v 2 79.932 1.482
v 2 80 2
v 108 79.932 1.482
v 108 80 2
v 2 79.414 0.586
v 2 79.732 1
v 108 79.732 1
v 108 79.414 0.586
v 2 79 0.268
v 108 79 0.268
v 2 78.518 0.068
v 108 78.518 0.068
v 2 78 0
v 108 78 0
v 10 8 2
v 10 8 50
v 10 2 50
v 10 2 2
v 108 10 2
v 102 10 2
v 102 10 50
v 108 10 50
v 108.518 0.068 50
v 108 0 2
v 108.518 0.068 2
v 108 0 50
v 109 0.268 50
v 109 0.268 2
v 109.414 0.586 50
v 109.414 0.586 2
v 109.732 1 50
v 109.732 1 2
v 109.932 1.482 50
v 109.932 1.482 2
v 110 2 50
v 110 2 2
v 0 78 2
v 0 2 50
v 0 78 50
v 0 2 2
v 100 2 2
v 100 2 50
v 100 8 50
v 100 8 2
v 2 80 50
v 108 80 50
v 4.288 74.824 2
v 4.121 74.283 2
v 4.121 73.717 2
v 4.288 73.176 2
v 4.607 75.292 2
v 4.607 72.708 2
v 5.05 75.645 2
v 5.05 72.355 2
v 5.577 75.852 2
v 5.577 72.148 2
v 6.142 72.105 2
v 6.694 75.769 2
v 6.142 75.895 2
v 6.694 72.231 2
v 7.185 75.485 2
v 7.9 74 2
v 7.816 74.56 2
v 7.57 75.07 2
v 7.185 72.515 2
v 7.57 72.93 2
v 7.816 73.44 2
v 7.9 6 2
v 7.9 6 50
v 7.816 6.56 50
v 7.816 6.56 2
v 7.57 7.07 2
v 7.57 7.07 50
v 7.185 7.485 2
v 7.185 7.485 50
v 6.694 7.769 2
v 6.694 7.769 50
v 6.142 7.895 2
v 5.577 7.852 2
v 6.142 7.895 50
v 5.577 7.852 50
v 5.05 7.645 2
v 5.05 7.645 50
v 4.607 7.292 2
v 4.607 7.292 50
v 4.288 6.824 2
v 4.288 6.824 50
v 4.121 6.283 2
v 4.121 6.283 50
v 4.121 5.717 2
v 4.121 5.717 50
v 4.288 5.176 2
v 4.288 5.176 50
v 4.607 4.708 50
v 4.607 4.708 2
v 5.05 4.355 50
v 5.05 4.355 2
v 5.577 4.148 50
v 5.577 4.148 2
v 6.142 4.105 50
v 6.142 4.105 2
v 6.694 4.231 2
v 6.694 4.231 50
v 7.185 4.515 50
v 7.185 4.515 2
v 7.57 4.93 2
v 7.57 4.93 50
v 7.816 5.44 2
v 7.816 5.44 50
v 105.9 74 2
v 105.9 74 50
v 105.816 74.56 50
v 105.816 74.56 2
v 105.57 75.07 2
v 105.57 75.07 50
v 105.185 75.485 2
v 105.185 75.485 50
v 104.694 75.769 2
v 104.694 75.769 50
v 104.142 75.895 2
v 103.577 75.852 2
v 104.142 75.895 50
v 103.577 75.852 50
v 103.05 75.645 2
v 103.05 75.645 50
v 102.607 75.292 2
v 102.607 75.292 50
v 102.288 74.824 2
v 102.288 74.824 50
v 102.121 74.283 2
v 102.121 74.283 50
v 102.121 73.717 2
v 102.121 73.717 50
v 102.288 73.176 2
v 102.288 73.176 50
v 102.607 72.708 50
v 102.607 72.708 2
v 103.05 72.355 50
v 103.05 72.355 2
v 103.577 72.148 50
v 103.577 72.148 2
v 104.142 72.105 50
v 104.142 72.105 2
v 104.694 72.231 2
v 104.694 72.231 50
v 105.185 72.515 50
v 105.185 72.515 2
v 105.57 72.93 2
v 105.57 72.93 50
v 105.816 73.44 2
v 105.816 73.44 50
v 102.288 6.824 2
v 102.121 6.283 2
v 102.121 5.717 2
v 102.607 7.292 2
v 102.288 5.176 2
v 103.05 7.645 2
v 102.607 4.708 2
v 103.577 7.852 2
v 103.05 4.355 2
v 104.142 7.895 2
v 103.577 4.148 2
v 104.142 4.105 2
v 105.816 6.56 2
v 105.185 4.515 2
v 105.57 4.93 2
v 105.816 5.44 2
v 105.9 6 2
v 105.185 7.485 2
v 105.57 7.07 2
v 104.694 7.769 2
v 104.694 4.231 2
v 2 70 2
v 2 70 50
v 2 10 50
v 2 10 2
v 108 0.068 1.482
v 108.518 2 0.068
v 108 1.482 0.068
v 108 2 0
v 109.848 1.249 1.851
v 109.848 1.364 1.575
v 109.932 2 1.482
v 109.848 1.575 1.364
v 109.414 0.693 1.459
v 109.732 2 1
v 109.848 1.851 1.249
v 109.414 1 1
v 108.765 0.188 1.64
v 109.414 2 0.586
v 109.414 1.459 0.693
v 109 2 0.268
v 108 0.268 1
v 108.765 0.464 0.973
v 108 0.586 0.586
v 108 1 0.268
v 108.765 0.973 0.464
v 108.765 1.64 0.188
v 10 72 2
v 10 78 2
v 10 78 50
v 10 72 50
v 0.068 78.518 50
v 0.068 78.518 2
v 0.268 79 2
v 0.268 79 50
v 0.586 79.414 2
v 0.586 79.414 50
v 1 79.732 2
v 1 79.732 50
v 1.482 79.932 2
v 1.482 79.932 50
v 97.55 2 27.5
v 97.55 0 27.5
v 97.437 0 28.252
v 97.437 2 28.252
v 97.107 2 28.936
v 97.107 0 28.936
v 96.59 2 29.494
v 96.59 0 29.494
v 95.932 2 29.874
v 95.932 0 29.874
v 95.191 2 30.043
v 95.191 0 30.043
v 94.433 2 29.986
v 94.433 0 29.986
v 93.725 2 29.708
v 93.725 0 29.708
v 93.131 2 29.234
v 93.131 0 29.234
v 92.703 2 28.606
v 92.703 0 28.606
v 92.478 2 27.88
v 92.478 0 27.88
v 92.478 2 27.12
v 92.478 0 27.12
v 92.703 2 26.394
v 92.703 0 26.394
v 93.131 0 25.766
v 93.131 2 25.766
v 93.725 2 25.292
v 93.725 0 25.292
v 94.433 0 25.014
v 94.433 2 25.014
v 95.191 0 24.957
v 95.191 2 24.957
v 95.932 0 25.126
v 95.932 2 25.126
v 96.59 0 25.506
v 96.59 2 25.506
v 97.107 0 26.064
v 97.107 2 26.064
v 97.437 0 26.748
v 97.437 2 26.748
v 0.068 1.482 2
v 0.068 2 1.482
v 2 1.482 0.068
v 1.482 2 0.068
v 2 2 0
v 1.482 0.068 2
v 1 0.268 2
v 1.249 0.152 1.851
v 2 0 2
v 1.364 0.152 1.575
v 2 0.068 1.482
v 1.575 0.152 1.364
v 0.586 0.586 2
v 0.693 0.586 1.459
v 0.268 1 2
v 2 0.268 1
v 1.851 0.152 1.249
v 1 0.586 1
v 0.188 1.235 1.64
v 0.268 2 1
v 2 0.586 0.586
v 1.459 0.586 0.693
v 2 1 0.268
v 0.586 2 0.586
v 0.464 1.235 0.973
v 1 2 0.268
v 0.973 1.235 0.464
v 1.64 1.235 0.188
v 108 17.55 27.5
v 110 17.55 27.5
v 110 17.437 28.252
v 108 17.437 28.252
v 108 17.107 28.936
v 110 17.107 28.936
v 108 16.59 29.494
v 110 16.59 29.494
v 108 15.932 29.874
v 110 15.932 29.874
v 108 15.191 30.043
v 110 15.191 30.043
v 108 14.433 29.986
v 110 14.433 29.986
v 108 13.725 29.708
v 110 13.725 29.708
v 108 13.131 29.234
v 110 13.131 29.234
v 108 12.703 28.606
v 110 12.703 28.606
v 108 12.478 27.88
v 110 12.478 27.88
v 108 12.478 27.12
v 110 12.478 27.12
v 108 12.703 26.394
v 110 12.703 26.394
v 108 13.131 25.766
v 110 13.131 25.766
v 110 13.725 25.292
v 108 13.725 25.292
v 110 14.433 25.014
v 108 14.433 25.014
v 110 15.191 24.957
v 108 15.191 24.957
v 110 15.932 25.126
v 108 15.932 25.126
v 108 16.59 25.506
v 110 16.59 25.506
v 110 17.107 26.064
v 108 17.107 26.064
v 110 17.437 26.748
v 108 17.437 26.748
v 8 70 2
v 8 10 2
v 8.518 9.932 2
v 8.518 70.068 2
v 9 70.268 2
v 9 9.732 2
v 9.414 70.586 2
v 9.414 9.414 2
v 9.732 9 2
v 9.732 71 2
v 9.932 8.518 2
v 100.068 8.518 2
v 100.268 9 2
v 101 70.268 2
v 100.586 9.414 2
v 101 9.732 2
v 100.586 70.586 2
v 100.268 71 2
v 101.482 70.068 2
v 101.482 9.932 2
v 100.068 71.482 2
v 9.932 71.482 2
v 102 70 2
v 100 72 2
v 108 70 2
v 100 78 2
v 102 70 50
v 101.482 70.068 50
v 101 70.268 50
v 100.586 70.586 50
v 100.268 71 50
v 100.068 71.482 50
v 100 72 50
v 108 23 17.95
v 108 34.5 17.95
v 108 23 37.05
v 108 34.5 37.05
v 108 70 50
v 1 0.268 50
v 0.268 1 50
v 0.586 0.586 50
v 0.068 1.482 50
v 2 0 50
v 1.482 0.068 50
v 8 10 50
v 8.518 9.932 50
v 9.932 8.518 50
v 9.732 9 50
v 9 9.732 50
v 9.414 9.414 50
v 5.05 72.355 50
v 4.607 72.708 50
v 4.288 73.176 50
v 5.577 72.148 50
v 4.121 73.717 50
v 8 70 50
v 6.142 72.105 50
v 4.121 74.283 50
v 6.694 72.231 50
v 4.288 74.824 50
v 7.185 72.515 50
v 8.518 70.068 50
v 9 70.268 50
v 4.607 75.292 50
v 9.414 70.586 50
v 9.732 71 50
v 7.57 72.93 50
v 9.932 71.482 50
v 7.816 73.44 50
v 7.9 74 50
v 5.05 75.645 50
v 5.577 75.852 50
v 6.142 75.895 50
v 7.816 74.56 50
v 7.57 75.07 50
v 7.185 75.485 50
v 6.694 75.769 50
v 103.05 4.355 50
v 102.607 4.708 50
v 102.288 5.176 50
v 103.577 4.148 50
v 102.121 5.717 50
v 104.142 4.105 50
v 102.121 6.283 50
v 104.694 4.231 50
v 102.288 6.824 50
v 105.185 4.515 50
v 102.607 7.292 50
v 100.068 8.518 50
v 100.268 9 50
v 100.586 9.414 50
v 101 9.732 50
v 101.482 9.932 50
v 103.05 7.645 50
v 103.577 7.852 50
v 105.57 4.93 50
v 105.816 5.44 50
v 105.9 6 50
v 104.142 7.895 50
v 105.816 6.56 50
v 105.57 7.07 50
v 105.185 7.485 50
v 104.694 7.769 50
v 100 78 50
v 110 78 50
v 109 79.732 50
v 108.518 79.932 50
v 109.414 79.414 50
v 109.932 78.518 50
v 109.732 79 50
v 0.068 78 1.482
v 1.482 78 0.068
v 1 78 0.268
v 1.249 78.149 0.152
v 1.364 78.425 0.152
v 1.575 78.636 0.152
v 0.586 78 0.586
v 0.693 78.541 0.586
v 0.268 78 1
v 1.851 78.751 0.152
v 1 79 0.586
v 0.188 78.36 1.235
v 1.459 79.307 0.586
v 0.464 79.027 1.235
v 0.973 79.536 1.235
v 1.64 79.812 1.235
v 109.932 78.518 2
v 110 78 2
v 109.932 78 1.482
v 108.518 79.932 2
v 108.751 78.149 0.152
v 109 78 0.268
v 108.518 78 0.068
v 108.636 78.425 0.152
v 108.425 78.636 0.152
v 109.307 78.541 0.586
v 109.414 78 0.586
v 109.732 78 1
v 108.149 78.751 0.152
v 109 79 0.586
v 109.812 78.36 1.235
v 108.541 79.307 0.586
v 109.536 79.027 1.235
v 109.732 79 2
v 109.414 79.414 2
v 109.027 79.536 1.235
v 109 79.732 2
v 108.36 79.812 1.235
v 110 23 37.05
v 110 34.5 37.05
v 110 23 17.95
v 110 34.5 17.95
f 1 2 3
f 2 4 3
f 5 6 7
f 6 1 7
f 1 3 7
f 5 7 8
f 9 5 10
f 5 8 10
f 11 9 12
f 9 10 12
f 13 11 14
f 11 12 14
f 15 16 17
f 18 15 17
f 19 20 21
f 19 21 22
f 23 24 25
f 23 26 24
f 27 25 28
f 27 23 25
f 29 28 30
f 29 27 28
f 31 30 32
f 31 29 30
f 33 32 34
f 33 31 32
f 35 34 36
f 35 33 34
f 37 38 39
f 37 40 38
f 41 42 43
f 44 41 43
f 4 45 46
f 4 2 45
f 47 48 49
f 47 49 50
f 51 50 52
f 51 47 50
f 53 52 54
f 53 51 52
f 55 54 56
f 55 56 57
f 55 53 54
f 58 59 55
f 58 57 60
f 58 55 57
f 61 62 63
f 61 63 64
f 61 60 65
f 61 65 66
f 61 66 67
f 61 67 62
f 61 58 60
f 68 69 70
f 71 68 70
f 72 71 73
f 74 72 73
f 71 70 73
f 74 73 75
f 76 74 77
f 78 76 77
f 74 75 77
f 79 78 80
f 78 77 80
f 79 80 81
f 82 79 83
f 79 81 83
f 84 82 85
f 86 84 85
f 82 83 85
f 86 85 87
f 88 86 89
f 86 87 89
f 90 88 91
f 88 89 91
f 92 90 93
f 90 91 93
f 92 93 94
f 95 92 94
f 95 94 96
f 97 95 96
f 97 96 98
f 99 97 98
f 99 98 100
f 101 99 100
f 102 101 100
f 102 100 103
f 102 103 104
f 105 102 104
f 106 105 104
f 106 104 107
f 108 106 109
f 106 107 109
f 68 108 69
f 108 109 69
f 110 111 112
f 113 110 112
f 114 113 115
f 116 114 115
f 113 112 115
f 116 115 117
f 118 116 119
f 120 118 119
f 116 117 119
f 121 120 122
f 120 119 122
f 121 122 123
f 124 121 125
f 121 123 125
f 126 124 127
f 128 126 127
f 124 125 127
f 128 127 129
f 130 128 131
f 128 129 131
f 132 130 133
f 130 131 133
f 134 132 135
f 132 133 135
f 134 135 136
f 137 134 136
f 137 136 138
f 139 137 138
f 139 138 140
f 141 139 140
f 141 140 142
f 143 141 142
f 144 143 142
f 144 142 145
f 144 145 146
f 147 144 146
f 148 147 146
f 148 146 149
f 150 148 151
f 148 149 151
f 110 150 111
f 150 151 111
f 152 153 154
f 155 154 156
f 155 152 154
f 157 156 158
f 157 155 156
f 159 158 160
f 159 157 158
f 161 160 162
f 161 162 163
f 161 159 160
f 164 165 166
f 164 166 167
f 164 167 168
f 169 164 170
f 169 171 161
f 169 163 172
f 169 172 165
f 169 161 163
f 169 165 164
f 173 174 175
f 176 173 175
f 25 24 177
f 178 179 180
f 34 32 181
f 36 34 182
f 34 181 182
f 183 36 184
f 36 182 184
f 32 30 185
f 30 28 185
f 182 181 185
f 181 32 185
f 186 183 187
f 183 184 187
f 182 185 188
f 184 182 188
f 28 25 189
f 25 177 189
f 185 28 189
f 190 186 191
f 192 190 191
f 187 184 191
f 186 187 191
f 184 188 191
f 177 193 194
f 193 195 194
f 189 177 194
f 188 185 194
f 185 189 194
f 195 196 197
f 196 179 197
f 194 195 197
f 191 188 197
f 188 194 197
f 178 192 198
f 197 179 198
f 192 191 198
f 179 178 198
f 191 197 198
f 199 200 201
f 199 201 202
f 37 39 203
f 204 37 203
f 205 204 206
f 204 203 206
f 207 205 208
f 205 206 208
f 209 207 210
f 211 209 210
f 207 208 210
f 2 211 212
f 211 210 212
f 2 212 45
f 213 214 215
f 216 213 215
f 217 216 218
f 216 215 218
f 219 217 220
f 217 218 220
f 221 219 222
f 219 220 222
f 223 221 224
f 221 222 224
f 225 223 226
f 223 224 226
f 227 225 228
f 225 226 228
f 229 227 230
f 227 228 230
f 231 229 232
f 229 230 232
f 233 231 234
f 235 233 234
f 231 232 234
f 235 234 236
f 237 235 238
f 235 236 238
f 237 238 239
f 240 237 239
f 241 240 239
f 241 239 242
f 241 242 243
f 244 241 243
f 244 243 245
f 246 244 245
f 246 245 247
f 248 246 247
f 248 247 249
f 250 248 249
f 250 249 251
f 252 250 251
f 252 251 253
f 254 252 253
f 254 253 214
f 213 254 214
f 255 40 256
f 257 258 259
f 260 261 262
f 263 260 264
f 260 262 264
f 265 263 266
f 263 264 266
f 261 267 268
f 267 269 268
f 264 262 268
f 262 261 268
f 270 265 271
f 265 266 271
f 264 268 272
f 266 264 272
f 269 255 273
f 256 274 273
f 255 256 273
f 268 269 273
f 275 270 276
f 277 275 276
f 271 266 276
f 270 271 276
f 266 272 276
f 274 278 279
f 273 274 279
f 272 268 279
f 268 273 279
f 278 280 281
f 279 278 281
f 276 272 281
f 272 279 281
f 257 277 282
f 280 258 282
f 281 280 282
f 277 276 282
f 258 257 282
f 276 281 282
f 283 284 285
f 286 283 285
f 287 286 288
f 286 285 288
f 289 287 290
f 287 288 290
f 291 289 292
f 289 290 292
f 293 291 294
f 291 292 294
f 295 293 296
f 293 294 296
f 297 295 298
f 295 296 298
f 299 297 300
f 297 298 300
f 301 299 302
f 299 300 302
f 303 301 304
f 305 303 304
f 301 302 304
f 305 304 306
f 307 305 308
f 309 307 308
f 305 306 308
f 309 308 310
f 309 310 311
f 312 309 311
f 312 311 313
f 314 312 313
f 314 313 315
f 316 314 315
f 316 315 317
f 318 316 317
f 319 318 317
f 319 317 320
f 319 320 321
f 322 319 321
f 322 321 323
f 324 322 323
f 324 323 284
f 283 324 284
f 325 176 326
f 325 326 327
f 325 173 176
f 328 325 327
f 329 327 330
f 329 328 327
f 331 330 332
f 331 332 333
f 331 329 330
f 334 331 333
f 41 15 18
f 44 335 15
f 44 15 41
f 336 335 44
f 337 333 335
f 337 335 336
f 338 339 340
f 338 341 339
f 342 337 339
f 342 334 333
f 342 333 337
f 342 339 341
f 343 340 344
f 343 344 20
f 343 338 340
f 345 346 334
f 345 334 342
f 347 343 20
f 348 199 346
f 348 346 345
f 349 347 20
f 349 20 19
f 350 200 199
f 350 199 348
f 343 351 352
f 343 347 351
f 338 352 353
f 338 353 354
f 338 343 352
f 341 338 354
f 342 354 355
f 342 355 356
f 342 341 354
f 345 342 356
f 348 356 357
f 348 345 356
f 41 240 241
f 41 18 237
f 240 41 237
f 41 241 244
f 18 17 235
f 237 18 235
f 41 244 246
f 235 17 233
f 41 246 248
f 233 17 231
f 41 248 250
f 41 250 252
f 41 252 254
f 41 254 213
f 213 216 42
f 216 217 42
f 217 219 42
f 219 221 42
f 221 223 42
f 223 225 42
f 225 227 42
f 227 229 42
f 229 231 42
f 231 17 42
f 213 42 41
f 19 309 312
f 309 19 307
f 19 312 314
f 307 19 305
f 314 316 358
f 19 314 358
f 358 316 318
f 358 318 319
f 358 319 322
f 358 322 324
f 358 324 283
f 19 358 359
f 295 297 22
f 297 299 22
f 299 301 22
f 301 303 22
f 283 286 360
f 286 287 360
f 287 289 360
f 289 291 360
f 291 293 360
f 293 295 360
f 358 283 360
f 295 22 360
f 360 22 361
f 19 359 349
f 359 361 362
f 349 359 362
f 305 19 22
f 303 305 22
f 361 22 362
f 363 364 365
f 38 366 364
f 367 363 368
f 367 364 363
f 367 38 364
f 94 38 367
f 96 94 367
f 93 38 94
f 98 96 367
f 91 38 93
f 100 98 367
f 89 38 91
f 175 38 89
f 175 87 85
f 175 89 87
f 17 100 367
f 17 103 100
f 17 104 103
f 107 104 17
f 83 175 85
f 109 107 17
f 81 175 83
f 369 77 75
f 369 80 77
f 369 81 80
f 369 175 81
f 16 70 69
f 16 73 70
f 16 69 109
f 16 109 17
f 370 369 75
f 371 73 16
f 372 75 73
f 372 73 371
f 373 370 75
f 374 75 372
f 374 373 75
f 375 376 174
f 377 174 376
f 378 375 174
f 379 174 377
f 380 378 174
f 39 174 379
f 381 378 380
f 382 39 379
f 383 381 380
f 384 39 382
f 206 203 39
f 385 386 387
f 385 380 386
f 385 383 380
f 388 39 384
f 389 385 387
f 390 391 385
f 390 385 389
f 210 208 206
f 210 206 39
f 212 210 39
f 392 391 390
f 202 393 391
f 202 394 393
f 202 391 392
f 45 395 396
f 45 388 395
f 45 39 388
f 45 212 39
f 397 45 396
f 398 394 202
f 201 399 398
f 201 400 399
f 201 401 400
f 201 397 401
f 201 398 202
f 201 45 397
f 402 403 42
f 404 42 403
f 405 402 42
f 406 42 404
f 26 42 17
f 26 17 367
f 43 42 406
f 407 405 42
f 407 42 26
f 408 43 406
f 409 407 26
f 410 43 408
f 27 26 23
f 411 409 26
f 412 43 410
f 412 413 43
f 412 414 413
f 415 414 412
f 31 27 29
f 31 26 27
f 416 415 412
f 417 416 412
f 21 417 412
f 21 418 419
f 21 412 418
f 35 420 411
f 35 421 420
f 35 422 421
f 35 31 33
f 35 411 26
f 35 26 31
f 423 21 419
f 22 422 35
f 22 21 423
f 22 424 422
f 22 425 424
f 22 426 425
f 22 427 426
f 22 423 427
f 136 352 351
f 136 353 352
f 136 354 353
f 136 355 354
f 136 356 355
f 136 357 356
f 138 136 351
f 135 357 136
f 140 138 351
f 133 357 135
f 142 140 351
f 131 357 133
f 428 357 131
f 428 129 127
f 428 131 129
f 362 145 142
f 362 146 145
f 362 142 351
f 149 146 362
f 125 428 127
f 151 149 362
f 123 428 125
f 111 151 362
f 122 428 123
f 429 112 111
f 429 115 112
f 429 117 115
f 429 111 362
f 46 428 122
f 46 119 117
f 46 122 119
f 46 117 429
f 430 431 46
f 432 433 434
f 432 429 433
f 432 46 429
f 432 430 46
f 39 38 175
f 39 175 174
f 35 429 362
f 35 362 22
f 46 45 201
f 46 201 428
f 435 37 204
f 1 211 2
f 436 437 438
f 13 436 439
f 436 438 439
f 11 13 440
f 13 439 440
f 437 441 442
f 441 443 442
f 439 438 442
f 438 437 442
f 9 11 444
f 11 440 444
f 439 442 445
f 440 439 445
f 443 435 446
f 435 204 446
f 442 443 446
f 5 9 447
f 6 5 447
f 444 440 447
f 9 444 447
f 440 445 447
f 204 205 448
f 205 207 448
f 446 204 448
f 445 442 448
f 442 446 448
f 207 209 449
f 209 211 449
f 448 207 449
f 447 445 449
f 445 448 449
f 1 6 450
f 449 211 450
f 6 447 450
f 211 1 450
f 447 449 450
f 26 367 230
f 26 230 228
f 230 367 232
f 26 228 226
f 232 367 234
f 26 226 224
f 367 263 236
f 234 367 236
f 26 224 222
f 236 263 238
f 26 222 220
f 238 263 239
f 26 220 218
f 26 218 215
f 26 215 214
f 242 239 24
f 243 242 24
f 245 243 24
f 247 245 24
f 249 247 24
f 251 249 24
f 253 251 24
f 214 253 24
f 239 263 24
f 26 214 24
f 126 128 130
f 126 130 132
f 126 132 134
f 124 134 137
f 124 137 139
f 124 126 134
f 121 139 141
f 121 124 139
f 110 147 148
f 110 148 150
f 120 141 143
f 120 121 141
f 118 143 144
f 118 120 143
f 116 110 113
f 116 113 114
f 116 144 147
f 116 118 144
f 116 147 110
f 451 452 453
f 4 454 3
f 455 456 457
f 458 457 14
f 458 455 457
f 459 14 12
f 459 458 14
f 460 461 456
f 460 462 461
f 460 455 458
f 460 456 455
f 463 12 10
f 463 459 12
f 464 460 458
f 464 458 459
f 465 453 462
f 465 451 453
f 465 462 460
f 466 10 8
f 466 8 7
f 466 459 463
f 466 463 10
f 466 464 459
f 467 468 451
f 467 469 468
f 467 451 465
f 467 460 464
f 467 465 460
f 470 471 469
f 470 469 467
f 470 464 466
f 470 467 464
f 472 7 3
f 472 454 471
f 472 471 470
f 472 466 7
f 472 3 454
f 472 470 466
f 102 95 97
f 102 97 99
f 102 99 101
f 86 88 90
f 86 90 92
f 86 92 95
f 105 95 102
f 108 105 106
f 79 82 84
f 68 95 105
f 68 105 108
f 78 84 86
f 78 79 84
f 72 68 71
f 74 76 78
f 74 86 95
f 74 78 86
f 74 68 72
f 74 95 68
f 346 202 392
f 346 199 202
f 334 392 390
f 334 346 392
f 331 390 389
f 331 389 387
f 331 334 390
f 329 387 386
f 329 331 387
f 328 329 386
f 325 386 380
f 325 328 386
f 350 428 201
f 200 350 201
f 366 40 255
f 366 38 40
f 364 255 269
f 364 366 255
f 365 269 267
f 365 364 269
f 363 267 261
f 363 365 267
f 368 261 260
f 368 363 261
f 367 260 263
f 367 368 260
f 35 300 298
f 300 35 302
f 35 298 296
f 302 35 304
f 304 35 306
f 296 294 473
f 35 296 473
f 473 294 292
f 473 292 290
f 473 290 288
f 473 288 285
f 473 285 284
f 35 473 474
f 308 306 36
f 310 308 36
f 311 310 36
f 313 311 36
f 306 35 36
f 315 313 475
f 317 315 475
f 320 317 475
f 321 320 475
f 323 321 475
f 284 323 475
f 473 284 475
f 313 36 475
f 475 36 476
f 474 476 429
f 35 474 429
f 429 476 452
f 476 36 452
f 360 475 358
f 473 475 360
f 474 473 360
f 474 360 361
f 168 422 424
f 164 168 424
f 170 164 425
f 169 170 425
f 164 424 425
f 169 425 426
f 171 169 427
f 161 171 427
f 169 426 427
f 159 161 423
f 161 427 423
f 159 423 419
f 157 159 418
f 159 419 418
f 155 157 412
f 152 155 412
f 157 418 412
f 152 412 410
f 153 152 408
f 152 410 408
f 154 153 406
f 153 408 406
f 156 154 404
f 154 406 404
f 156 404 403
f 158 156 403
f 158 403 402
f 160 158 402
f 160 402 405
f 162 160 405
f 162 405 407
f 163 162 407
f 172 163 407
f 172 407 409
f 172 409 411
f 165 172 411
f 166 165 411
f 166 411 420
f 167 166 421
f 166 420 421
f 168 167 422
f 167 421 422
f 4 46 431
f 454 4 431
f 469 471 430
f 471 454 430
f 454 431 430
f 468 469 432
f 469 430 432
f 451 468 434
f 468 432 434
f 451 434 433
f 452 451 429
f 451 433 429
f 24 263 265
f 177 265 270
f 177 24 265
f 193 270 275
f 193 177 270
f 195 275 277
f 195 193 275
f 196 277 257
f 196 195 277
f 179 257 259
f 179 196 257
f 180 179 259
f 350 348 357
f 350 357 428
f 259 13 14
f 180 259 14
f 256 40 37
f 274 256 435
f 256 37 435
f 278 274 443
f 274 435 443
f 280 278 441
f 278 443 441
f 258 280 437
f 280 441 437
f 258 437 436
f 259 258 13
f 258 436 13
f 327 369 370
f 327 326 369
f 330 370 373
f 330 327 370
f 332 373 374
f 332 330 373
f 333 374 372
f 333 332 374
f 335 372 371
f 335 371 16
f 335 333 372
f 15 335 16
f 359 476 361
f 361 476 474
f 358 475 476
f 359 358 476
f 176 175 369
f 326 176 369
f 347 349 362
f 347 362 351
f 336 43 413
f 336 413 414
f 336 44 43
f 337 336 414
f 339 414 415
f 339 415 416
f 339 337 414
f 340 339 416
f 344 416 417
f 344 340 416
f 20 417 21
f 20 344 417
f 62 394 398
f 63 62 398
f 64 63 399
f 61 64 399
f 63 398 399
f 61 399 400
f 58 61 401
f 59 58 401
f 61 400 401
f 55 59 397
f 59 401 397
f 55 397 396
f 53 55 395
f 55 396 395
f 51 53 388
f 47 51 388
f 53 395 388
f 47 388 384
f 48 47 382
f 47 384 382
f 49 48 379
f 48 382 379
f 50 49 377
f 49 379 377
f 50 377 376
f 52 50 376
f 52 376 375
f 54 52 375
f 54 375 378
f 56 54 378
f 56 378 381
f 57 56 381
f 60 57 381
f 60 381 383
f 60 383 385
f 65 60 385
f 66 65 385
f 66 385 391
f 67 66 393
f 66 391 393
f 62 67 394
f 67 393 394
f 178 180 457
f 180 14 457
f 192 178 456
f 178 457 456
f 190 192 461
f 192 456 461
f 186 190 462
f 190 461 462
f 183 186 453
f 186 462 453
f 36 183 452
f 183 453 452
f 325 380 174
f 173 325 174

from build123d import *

# Parameters (mm, degrees)
SKETCH_W        = 110
SKETCH_H        = 80
PAD_DEPTH       = 50
SKETCH001_R     = 1.9
POCKET_DEPTH    = 48
FILLET_R        = 2
FILLET001_R     = 2
SKETCH002_R     = 2.55
SKETCH002_W     = 11.5
SKETCH002_H     = 19.1
POCKET001_DEPTH = 5
SKETCH003_R     = 2.55
POCKET002_DEPTH = 5


with BuildPart() as part:
    # Sketch → Pad (new body)
    with BuildSketch(Plane.XY):
        with Locations((55, 40)):
            Rectangle(SKETCH_W, SKETCH_H)
    extrude(amount=PAD_DEPTH)

    # Sketch001 (on Face6 of Pad) → Pocket (cut)
    with BuildSketch(Plane.XY.offset(50)):
        with Locations((6, 74)):
            Circle(SKETCH001_R)
        with Locations((104, 74)):
            Circle(SKETCH001_R)
        with Locations((104, 6)):
            Circle(SKETCH001_R)
        with Locations((6, 6)):
            Circle(SKETCH001_R)
        Polygon((2, 10), (10, 10), (10, 2), (100, 2), (100, 10), (108, 10), (108, 70), (100, 70), (100, 78), (10, 78), (10, 70), (2, 70), align=None)
    extrude(amount=-POCKET_DEPTH, mode=Mode.SUBTRACT)

    # Fillet
    fillet_edges = [part.edges().sort_by_distance(p)[0] for p in [
        (0, 80, 25),
        (0, 40, 0),
        (0, 0, 25),
        (55, 0, 0),
        (110, 0, 25),
        (110, 80, 25),
        (110, 40, 0),
        (55, 80, 0),
    ]]
    fillet(fillet_edges, radius=FILLET_R)

    # Fillet001
    fillet001_edges = [part.edges().sort_by_distance(p)[0] for p in [
        (100, 10, 26),
        (100, 70, 26),
        (10, 70, 26),
        (10, 10, 26),
    ]]
    fillet(fillet001_edges, radius=FILLET001_R)

    # Sketch002 (on Face22 of Fillet001) → Pocket001 (cut)
    with BuildSketch(Plane.YZ.offset(110)):
        with Locations((15, 27.5)):
            Circle(SKETCH002_R)
        with Locations((28.75, 27.5)):
            Rectangle(SKETCH002_W, SKETCH002_H)
    extrude(amount=-POCKET001_DEPTH, mode=Mode.SUBTRACT)

    # Sketch003 (on Face18 of Pocket001) → Pocket002 (cut)
    with BuildSketch(Plane.XZ):
        with Locations((95, 27.5)):
            Circle(SKETCH003_R)
    extrude(amount=-POCKET002_DEPTH, mode=Mode.SUBTRACT)


solid = part.part
